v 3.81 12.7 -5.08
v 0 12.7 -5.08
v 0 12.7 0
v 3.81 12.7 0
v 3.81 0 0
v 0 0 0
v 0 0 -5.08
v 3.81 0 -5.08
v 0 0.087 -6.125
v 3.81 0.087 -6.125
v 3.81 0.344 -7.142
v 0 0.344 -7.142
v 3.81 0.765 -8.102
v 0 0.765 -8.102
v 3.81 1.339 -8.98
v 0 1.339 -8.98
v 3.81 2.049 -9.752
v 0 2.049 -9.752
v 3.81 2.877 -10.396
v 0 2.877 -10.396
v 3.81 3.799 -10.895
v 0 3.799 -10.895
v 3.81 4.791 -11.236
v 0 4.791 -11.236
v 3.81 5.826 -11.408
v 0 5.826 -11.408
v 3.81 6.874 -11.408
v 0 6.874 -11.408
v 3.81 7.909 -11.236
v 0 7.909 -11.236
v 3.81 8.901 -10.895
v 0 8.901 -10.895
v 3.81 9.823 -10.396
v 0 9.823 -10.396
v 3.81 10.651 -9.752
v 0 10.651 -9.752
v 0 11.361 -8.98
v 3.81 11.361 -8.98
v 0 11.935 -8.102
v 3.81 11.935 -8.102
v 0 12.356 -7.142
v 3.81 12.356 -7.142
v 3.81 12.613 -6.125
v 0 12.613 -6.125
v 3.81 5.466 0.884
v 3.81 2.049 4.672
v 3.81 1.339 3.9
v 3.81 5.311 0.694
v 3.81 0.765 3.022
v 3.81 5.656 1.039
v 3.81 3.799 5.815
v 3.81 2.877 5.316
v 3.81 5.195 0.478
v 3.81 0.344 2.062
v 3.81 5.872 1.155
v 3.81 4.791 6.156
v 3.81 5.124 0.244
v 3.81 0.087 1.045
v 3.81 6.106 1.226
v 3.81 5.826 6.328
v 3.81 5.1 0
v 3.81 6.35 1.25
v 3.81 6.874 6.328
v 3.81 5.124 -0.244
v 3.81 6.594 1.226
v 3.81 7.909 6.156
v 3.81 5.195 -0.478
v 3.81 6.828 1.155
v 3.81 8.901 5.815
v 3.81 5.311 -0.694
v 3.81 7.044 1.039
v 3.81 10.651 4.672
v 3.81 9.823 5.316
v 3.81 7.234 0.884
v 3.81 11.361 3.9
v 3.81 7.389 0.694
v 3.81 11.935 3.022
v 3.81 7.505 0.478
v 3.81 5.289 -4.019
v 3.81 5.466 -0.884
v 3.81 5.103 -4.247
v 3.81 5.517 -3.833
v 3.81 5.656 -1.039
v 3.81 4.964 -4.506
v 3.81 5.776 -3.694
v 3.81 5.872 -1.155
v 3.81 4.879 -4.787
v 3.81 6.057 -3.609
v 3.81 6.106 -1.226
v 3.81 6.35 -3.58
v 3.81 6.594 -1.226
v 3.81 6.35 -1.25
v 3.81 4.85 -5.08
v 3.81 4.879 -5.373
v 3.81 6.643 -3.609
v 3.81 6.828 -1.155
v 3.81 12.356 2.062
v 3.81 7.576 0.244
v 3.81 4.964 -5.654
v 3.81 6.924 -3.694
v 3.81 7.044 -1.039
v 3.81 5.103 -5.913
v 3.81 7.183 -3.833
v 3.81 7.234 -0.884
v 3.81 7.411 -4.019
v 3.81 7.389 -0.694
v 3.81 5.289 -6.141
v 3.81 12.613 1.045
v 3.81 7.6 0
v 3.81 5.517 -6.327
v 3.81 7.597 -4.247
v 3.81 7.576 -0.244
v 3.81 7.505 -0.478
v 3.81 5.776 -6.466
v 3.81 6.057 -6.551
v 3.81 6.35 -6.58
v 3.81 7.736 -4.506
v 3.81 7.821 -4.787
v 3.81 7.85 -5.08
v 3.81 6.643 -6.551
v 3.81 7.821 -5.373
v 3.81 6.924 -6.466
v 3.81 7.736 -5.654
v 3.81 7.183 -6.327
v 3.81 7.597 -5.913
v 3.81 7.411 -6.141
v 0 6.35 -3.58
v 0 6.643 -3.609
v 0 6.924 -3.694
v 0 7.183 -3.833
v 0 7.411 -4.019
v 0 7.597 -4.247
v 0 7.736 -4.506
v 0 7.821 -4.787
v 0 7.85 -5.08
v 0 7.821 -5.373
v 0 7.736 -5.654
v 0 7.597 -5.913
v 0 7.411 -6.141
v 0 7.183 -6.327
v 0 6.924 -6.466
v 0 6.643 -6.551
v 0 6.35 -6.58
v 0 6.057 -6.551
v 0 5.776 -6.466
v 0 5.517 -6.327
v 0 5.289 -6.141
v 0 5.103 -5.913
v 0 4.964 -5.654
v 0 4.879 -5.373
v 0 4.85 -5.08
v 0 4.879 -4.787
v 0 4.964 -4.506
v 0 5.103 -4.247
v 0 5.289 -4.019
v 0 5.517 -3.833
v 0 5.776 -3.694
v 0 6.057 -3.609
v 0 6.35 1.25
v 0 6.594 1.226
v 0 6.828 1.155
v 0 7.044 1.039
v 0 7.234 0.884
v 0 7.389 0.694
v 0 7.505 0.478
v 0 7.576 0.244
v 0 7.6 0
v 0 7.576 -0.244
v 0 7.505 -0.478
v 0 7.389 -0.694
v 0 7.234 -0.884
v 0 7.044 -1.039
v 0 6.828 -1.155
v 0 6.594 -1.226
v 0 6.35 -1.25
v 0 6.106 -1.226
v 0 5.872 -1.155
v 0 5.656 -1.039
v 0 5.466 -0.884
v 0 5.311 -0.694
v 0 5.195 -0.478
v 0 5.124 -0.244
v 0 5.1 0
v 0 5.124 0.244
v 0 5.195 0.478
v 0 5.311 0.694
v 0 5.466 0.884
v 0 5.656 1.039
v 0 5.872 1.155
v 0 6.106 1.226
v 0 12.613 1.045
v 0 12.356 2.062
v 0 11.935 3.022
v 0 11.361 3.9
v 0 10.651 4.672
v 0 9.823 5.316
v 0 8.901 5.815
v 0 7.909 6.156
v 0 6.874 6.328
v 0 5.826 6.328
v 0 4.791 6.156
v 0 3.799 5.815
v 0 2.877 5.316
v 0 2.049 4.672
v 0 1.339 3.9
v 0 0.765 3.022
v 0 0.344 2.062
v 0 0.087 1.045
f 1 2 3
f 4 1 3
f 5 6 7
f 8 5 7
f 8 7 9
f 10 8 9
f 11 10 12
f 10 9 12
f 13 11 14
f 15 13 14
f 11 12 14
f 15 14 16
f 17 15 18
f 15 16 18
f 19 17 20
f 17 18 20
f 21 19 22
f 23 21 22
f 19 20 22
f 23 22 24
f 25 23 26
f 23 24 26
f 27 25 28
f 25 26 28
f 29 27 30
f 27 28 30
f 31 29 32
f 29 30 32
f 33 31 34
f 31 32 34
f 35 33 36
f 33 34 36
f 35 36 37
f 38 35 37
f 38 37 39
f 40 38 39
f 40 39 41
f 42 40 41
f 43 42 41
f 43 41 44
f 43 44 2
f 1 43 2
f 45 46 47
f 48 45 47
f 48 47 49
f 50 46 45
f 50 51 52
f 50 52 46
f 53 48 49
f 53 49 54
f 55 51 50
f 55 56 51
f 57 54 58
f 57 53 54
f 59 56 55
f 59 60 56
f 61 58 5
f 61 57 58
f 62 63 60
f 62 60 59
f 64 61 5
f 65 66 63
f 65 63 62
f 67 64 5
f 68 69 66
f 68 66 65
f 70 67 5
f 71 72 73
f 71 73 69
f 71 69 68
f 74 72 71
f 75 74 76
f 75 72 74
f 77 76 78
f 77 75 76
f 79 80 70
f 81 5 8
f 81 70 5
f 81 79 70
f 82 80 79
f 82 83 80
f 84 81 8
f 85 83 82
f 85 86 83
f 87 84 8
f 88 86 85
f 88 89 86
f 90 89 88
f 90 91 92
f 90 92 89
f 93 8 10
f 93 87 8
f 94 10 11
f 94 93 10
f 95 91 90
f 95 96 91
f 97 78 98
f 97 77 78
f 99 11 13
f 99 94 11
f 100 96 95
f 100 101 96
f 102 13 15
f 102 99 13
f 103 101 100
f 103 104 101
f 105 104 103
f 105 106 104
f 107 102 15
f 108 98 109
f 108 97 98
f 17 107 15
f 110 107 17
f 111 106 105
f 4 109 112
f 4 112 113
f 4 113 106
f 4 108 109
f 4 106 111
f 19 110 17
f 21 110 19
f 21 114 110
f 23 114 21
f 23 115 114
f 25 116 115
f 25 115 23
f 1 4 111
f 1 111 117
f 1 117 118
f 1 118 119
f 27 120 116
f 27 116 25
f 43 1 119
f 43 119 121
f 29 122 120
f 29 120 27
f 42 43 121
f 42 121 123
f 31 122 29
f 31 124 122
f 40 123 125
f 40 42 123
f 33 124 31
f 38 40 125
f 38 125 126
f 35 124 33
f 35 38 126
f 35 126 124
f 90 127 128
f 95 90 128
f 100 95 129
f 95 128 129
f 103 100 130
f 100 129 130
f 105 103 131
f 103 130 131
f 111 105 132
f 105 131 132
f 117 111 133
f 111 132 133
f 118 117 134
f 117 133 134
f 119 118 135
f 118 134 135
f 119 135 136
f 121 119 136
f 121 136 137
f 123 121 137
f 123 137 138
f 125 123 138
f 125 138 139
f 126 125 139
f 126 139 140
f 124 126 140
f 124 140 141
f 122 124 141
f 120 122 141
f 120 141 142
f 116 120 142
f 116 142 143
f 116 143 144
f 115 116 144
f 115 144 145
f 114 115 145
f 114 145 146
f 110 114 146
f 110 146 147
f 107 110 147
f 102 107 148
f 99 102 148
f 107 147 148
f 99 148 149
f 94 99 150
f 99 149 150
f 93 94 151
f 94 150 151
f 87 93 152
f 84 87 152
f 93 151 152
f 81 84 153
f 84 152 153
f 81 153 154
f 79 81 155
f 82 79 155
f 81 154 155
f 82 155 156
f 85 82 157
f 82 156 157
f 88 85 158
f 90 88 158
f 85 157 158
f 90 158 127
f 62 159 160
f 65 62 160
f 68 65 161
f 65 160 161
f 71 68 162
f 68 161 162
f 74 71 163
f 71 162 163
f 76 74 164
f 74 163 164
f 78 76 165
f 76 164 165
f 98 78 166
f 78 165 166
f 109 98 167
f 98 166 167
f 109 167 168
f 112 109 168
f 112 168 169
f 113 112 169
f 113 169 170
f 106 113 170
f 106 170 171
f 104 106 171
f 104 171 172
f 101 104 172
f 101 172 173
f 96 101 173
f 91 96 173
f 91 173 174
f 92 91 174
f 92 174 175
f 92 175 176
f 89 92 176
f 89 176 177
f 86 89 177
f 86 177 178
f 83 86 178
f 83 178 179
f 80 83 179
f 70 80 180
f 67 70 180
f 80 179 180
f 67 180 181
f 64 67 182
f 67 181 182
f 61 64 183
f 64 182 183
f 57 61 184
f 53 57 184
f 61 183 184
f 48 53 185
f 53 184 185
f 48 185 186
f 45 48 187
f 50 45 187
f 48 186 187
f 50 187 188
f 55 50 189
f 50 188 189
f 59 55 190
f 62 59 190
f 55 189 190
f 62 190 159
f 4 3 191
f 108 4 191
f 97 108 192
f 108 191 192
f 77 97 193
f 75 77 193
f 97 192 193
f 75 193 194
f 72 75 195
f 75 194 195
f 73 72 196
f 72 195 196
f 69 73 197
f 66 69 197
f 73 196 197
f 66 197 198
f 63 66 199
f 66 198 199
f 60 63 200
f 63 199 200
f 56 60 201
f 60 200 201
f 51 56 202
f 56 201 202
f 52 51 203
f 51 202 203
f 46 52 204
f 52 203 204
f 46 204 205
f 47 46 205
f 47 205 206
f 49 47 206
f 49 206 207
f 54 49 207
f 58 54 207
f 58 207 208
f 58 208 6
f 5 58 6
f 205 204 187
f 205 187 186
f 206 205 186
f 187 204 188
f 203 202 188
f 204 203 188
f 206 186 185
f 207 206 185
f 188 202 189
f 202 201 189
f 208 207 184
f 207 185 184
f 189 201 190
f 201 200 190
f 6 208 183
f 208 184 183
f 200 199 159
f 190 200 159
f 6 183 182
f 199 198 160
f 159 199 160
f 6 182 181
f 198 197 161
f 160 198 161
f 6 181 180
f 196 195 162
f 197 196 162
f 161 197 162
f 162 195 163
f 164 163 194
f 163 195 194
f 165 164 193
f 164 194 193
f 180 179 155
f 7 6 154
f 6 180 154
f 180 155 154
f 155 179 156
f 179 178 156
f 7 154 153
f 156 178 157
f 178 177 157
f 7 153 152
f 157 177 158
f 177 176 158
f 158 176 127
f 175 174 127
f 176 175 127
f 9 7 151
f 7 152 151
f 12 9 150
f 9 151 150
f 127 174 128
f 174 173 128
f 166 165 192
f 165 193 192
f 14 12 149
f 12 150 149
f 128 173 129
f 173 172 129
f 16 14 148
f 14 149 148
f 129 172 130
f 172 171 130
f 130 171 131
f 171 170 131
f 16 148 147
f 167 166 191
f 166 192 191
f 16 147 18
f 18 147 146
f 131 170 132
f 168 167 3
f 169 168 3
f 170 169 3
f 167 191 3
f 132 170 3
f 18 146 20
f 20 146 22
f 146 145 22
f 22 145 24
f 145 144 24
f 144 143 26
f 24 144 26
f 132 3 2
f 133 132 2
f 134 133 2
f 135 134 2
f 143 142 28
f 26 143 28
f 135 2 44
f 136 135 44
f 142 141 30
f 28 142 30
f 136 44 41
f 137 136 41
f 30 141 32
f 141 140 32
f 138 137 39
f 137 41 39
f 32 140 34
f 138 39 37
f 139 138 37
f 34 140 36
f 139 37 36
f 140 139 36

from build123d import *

# Parameters (mm, degrees)
BOSS_EXTRUDE1_DEPTH     = 3.81
TAP_DRILL_FOR_M3_TAP1_D = 2.5
F_3_0MM_DOWEL_HOLE1_D   = 3


with BuildPart() as part:
    # Sketch1 → Boss-Extrude1 (new body)
    with BuildSketch(Plane(origin=(0, 0, 0), x_dir=(0, 0, -1), z_dir=(1, 0, 0))):
        with BuildLine():
            Line((0, 0), (5.08, 0))
            ThreePointArc((5.08, 0), (11.43, 6.35), (5.08, 12.7))
            Line((5.08, 12.7), (0, 12.7))
            ThreePointArc((0, 12.7), (-6.35, 6.35), (0, 0))
        make_face()
    extrude(amount=BOSS_EXTRUDE1_DEPTH)

    # Tap Drill for M3 Tap1 (through all)
    with Locations(Plane(origin=(3.81, 0, 0), x_dir=(0, 0, -1), z_dir=(1, 0, 0))):
        with Locations((0, 6.35)):
            Hole(TAP_DRILL_FOR_M3_TAP1_D / 2)

    # Ø3.0mm Dowel Hole1 (through all)
    with Locations(Plane(origin=(3.81, 0, 0), x_dir=(0, 0, -1), z_dir=(1, 0, 0))):
        with Locations((5.08, 6.35)):
            Hole(F_3_0MM_DOWEL_HOLE1_D / 2)


solid = part.part
